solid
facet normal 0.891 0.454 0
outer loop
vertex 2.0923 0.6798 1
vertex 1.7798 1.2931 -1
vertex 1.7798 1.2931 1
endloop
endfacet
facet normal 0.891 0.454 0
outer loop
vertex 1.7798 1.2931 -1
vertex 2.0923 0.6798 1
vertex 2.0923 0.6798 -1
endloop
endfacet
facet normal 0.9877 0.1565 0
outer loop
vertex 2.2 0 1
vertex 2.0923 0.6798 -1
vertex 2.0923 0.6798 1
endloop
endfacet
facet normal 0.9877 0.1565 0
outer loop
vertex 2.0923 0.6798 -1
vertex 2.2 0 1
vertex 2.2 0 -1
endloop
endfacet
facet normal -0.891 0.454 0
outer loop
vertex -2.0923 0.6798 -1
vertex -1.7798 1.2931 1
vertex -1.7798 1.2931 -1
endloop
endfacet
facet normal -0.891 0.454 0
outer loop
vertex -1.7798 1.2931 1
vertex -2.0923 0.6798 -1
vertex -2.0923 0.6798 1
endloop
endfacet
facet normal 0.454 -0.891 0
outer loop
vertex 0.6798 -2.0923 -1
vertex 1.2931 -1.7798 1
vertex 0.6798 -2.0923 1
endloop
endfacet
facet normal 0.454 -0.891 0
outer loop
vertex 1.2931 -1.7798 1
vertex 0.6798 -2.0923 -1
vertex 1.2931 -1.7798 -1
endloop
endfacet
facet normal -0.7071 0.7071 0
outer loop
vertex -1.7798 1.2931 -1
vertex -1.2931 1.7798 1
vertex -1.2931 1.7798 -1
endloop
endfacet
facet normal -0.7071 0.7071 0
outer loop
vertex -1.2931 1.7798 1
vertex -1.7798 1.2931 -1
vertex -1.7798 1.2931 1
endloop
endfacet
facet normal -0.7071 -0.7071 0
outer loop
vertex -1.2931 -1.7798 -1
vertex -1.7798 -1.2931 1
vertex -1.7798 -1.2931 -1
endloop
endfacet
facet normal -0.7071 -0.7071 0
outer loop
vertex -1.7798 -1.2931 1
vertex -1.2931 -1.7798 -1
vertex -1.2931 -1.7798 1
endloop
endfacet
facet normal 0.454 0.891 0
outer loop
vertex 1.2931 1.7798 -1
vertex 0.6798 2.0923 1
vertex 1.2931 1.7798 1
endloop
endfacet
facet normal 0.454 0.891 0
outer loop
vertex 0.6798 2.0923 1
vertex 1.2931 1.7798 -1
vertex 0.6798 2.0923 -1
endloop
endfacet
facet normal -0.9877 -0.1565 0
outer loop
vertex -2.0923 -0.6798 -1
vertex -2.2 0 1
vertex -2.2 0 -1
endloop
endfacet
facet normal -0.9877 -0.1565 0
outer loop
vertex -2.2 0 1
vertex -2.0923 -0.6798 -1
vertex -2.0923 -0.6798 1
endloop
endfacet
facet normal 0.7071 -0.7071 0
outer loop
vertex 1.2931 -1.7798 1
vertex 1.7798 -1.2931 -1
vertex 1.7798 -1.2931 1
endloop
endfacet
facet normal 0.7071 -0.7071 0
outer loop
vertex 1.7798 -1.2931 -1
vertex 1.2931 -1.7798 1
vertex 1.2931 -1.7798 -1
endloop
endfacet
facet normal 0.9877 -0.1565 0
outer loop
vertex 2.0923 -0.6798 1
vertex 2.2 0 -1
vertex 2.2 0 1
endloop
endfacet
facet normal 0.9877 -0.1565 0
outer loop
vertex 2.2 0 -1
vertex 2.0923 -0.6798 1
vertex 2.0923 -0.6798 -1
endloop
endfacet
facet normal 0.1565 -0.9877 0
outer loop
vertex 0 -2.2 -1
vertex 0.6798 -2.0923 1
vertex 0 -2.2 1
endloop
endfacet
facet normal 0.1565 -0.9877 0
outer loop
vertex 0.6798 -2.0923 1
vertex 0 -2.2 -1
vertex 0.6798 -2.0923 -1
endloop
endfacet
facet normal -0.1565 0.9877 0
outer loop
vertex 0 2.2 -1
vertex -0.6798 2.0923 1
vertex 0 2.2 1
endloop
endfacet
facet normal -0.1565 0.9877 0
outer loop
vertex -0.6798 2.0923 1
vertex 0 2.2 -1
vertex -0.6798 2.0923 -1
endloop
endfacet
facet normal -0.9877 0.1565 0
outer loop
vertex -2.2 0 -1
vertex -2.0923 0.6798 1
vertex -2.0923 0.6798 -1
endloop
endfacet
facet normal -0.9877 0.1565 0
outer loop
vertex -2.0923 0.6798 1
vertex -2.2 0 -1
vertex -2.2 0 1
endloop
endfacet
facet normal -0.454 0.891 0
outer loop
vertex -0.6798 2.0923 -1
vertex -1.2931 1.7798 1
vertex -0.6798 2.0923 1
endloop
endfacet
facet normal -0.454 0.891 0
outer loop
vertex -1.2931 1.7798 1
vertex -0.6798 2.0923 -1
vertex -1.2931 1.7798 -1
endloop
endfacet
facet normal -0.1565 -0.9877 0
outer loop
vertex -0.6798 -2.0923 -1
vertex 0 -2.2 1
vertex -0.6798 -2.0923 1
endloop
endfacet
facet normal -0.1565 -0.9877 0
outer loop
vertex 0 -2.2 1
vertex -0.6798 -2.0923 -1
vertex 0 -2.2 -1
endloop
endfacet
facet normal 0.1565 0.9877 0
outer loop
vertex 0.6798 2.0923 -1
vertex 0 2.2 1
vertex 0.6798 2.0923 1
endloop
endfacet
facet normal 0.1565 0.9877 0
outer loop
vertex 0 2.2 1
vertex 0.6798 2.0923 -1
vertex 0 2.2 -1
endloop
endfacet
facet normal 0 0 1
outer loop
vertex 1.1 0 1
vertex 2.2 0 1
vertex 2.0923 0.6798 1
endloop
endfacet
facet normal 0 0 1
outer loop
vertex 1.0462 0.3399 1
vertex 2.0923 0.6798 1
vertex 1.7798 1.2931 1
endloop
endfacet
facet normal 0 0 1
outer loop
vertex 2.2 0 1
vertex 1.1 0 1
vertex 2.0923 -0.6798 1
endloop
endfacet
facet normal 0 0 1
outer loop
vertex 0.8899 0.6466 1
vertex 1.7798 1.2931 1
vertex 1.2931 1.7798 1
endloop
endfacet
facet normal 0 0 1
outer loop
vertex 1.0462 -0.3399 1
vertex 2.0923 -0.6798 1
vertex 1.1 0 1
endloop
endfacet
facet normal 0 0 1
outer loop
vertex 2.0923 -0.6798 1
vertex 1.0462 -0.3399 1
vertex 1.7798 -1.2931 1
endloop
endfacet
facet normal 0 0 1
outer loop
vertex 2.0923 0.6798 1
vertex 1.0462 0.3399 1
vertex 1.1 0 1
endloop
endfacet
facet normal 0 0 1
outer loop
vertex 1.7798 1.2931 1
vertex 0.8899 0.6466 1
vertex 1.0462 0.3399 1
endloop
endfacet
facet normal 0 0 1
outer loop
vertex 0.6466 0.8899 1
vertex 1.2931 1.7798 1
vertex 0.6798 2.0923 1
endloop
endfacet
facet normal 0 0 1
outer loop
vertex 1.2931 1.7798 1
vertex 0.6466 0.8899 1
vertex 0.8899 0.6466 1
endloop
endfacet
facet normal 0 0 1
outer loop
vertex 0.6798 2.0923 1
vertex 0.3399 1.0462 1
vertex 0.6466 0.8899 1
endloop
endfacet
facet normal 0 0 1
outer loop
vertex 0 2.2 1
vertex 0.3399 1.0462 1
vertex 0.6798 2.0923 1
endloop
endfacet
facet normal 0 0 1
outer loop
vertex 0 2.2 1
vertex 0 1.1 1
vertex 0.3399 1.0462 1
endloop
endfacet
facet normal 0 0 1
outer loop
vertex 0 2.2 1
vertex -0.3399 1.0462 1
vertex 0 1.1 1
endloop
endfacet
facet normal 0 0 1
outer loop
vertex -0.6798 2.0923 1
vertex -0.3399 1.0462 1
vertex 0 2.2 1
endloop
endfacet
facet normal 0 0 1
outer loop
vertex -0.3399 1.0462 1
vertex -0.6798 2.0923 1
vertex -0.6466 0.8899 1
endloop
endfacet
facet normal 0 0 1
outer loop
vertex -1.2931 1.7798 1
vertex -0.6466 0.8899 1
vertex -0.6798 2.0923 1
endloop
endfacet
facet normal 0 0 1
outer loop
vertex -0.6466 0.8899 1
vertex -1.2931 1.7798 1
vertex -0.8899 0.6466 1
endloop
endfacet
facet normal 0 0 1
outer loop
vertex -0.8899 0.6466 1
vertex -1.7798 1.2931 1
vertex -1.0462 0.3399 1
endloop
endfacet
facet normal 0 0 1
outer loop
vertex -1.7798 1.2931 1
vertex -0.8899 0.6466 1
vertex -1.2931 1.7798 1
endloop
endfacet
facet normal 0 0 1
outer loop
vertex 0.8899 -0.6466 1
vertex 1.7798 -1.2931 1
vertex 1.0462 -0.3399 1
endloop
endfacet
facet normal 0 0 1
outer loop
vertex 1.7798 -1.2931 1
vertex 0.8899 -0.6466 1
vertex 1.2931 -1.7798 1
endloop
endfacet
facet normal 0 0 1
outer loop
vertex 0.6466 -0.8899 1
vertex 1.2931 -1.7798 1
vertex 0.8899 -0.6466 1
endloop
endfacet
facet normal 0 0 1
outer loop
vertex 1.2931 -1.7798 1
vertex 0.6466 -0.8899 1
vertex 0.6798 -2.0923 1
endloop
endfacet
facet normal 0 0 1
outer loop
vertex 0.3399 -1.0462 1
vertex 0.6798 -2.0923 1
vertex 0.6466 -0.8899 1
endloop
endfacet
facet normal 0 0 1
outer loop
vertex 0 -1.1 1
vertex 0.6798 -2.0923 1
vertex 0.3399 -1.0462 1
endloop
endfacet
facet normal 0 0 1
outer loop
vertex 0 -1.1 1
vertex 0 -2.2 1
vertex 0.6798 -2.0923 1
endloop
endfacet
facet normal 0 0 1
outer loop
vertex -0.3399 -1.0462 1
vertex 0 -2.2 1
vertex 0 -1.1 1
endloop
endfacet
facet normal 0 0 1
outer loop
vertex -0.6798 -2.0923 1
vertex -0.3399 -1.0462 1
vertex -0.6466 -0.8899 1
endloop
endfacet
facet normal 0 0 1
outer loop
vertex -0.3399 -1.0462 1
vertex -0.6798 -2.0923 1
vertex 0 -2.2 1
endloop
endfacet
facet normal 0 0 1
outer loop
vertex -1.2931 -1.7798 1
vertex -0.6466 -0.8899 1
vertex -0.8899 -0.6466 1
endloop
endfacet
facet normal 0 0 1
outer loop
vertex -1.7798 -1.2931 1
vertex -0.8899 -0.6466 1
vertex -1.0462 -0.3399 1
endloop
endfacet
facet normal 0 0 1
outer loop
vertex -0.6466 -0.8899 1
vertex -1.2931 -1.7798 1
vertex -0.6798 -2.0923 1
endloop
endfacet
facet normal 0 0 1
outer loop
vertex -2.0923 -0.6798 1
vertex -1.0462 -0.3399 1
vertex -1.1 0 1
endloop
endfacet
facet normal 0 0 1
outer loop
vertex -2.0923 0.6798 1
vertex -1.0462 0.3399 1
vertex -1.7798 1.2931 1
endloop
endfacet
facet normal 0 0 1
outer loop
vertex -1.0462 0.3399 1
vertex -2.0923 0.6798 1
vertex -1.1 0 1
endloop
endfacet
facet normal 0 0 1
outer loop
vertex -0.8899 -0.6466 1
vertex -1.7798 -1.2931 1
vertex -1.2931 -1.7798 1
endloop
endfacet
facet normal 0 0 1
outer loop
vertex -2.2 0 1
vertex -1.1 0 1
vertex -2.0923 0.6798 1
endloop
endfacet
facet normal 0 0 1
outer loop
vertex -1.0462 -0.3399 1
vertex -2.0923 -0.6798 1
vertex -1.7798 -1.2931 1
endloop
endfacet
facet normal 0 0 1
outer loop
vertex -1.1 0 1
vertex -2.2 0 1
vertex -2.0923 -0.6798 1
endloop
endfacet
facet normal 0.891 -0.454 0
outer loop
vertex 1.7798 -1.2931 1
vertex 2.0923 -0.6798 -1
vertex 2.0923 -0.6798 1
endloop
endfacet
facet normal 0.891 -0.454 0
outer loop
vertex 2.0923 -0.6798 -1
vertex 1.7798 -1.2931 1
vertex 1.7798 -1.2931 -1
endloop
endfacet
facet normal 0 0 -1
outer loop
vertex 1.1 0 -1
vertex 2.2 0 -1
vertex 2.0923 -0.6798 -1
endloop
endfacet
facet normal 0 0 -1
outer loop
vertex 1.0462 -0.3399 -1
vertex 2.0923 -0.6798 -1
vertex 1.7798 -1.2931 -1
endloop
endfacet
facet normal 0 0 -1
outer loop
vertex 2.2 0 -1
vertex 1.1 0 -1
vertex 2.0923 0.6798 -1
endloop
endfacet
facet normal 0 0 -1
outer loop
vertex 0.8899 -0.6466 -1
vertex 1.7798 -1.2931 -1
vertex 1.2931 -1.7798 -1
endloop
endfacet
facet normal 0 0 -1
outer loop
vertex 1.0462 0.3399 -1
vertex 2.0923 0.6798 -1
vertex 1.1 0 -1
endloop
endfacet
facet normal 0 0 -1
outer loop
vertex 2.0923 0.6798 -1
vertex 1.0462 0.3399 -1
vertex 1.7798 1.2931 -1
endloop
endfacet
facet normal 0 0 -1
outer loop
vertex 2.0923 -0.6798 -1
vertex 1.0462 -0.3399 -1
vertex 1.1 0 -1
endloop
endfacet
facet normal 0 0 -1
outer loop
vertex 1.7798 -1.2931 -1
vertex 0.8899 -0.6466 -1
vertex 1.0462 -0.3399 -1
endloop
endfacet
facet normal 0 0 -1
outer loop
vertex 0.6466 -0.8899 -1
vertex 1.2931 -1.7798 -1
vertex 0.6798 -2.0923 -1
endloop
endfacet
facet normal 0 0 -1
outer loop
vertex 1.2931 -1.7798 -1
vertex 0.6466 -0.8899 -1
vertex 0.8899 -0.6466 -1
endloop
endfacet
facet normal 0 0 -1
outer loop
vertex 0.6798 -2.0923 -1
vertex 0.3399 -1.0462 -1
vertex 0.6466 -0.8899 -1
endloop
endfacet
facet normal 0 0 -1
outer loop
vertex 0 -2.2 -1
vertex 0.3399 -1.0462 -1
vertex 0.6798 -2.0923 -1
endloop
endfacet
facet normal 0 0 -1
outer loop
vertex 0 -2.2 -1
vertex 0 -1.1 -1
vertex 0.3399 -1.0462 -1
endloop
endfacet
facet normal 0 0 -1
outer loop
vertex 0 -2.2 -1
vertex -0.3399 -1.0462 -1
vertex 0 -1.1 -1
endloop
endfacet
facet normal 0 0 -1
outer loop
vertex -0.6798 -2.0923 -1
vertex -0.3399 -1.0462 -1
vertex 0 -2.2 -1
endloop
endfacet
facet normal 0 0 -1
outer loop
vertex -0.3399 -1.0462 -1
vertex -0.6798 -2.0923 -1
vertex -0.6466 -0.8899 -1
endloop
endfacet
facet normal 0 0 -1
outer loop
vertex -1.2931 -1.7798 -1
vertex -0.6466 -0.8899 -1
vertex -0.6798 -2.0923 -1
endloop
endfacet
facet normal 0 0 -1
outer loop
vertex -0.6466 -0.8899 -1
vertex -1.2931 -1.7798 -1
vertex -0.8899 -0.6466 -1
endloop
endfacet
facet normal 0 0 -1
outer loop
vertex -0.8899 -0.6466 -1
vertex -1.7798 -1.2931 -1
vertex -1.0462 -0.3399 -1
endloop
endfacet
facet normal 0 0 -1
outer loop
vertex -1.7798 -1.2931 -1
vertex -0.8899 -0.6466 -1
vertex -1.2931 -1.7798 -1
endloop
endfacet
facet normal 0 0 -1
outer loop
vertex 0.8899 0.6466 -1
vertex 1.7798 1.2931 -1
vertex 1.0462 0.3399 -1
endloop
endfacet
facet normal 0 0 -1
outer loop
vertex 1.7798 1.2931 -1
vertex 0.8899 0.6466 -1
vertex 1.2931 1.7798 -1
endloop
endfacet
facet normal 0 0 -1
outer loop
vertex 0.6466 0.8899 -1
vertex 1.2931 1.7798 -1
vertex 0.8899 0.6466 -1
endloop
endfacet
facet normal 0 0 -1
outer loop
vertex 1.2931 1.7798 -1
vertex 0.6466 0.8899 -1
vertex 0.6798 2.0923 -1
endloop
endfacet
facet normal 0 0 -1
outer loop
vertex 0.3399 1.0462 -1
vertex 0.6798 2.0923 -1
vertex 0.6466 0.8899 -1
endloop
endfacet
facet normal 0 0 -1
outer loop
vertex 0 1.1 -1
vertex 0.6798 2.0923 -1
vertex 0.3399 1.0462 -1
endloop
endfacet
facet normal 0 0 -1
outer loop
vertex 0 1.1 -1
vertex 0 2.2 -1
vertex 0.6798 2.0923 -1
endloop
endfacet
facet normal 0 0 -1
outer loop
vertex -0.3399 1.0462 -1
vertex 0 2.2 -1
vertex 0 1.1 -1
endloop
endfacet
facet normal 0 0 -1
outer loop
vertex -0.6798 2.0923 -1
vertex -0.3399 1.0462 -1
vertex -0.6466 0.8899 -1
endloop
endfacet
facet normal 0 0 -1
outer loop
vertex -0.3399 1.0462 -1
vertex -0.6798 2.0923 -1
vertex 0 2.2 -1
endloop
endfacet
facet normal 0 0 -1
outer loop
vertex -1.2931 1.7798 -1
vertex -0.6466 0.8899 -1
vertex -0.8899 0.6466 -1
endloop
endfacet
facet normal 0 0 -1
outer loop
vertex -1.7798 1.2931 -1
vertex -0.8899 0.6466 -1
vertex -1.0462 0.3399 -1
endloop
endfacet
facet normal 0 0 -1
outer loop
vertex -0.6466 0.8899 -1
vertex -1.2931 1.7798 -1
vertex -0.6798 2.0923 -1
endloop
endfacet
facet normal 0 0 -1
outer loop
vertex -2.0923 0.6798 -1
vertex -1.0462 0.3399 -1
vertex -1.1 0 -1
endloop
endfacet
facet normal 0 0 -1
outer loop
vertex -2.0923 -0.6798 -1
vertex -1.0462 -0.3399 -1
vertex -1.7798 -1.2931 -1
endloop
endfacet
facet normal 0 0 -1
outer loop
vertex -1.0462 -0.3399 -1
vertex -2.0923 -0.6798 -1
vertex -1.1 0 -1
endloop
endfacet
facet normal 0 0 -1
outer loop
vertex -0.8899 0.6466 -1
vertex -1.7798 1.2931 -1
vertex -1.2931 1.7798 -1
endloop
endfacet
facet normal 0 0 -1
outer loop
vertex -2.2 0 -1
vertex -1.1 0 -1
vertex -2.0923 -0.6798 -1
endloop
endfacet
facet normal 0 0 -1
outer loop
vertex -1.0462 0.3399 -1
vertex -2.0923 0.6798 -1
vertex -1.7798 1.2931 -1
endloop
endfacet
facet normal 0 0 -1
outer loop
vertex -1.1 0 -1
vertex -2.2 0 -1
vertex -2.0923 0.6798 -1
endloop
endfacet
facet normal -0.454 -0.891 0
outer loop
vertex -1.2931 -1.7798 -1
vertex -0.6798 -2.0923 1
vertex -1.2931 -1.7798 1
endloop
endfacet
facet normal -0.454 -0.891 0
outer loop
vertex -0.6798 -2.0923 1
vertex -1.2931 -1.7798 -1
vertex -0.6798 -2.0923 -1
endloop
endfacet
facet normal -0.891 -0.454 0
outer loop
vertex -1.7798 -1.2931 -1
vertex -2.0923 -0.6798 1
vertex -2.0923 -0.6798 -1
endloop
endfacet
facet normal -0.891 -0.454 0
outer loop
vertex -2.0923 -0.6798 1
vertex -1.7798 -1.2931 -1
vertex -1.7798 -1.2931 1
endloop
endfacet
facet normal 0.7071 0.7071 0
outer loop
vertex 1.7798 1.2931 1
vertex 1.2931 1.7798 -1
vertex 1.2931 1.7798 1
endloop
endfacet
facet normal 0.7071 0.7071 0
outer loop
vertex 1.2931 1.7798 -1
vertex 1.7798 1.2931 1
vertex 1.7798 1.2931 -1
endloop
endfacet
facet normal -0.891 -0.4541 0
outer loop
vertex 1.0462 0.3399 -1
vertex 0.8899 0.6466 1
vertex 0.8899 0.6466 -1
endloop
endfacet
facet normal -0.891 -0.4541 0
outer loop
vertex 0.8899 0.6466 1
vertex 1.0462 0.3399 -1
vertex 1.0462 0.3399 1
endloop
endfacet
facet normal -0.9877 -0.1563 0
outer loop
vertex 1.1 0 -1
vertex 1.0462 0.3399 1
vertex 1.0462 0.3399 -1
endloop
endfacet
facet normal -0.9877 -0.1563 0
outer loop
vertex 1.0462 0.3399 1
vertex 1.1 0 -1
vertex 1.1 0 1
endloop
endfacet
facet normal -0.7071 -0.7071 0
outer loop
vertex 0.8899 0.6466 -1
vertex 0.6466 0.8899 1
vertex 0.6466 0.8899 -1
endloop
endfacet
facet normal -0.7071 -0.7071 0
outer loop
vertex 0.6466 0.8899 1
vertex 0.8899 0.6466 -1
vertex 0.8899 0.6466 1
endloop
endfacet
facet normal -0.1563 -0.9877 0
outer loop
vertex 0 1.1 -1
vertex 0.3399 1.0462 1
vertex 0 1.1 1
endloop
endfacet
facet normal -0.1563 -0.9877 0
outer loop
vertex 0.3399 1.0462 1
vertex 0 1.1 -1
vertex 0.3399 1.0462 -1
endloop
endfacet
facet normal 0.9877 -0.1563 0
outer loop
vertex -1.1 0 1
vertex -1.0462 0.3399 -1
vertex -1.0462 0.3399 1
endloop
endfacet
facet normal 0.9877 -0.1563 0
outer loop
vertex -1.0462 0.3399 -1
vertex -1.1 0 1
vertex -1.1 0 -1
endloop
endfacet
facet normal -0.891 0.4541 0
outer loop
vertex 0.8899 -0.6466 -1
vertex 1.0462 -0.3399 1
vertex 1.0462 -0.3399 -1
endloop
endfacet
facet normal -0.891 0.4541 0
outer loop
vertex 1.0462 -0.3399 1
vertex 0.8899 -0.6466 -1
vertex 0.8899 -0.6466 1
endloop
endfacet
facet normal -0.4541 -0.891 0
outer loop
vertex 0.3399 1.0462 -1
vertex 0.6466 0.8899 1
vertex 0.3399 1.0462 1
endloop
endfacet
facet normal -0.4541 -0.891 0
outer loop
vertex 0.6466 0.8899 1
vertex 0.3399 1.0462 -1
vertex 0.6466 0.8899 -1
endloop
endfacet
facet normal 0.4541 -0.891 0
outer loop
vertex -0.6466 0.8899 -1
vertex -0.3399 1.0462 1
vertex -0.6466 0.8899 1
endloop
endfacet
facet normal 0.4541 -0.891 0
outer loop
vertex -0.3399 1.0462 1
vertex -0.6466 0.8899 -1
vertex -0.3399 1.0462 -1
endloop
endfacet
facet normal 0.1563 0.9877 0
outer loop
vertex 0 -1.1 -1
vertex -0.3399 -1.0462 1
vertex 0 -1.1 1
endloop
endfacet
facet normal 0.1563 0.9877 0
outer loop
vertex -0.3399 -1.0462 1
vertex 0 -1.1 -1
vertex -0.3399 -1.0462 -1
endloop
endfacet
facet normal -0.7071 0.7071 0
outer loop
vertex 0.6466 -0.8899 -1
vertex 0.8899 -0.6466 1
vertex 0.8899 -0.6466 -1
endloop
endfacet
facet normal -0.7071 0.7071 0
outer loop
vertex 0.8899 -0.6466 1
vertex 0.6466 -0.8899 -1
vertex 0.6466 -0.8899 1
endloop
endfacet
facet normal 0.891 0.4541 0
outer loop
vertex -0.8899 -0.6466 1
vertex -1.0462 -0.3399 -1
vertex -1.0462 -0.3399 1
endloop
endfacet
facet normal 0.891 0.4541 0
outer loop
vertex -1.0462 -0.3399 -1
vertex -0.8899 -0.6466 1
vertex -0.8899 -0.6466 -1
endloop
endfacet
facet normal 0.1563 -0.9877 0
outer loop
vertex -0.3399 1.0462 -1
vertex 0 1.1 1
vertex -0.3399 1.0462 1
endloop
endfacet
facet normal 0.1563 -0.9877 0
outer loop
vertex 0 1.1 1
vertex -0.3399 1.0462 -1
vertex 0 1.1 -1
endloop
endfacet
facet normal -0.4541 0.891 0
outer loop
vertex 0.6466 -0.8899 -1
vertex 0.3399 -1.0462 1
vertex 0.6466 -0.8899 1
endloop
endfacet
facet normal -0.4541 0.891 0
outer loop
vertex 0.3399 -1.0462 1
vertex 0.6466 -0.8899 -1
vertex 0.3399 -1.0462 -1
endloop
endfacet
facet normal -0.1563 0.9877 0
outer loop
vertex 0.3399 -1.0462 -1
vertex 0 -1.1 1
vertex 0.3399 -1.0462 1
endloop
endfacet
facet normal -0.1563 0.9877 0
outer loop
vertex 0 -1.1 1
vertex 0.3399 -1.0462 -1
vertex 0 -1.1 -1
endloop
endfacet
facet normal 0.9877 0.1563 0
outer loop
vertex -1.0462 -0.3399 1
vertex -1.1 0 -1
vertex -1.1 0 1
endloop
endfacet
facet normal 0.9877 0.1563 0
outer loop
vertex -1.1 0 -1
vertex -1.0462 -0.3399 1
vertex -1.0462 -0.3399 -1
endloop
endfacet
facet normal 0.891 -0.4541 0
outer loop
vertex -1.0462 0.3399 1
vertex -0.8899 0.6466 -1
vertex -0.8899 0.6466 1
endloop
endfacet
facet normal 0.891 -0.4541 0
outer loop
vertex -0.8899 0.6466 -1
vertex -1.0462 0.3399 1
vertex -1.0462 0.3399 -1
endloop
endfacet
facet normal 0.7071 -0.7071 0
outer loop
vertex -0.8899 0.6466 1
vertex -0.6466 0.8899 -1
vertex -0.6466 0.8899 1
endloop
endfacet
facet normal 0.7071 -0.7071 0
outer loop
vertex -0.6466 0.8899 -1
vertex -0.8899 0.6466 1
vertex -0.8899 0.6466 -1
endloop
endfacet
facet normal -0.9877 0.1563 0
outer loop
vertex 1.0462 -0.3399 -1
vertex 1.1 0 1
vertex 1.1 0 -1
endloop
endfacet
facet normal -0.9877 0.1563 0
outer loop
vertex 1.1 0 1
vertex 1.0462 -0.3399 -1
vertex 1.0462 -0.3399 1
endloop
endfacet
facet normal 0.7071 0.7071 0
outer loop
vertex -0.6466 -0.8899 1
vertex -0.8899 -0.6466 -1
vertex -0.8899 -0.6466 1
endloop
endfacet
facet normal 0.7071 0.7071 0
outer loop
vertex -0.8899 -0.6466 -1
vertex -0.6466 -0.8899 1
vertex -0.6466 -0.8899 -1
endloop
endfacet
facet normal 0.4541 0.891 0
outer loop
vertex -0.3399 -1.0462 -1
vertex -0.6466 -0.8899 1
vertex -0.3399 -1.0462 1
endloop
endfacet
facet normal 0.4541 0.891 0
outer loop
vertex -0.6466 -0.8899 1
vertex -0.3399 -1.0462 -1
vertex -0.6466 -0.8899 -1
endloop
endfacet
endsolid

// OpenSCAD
// file: conf/config.scad
w=1.5;
t=w/2;
th=4;
font="Liberation Sans:style=Bold";

MAT="MAT";
SRC="grove-case";
FILE="";
VER="";
// main file
include <conf/config.scad>

h=2;
di=2.2;
do=di*2;

$fn=20;

difference() {
  cylinder(d=do, h=h,center=true);
  cylinder(d=di, h=h+1,center=true);
}
